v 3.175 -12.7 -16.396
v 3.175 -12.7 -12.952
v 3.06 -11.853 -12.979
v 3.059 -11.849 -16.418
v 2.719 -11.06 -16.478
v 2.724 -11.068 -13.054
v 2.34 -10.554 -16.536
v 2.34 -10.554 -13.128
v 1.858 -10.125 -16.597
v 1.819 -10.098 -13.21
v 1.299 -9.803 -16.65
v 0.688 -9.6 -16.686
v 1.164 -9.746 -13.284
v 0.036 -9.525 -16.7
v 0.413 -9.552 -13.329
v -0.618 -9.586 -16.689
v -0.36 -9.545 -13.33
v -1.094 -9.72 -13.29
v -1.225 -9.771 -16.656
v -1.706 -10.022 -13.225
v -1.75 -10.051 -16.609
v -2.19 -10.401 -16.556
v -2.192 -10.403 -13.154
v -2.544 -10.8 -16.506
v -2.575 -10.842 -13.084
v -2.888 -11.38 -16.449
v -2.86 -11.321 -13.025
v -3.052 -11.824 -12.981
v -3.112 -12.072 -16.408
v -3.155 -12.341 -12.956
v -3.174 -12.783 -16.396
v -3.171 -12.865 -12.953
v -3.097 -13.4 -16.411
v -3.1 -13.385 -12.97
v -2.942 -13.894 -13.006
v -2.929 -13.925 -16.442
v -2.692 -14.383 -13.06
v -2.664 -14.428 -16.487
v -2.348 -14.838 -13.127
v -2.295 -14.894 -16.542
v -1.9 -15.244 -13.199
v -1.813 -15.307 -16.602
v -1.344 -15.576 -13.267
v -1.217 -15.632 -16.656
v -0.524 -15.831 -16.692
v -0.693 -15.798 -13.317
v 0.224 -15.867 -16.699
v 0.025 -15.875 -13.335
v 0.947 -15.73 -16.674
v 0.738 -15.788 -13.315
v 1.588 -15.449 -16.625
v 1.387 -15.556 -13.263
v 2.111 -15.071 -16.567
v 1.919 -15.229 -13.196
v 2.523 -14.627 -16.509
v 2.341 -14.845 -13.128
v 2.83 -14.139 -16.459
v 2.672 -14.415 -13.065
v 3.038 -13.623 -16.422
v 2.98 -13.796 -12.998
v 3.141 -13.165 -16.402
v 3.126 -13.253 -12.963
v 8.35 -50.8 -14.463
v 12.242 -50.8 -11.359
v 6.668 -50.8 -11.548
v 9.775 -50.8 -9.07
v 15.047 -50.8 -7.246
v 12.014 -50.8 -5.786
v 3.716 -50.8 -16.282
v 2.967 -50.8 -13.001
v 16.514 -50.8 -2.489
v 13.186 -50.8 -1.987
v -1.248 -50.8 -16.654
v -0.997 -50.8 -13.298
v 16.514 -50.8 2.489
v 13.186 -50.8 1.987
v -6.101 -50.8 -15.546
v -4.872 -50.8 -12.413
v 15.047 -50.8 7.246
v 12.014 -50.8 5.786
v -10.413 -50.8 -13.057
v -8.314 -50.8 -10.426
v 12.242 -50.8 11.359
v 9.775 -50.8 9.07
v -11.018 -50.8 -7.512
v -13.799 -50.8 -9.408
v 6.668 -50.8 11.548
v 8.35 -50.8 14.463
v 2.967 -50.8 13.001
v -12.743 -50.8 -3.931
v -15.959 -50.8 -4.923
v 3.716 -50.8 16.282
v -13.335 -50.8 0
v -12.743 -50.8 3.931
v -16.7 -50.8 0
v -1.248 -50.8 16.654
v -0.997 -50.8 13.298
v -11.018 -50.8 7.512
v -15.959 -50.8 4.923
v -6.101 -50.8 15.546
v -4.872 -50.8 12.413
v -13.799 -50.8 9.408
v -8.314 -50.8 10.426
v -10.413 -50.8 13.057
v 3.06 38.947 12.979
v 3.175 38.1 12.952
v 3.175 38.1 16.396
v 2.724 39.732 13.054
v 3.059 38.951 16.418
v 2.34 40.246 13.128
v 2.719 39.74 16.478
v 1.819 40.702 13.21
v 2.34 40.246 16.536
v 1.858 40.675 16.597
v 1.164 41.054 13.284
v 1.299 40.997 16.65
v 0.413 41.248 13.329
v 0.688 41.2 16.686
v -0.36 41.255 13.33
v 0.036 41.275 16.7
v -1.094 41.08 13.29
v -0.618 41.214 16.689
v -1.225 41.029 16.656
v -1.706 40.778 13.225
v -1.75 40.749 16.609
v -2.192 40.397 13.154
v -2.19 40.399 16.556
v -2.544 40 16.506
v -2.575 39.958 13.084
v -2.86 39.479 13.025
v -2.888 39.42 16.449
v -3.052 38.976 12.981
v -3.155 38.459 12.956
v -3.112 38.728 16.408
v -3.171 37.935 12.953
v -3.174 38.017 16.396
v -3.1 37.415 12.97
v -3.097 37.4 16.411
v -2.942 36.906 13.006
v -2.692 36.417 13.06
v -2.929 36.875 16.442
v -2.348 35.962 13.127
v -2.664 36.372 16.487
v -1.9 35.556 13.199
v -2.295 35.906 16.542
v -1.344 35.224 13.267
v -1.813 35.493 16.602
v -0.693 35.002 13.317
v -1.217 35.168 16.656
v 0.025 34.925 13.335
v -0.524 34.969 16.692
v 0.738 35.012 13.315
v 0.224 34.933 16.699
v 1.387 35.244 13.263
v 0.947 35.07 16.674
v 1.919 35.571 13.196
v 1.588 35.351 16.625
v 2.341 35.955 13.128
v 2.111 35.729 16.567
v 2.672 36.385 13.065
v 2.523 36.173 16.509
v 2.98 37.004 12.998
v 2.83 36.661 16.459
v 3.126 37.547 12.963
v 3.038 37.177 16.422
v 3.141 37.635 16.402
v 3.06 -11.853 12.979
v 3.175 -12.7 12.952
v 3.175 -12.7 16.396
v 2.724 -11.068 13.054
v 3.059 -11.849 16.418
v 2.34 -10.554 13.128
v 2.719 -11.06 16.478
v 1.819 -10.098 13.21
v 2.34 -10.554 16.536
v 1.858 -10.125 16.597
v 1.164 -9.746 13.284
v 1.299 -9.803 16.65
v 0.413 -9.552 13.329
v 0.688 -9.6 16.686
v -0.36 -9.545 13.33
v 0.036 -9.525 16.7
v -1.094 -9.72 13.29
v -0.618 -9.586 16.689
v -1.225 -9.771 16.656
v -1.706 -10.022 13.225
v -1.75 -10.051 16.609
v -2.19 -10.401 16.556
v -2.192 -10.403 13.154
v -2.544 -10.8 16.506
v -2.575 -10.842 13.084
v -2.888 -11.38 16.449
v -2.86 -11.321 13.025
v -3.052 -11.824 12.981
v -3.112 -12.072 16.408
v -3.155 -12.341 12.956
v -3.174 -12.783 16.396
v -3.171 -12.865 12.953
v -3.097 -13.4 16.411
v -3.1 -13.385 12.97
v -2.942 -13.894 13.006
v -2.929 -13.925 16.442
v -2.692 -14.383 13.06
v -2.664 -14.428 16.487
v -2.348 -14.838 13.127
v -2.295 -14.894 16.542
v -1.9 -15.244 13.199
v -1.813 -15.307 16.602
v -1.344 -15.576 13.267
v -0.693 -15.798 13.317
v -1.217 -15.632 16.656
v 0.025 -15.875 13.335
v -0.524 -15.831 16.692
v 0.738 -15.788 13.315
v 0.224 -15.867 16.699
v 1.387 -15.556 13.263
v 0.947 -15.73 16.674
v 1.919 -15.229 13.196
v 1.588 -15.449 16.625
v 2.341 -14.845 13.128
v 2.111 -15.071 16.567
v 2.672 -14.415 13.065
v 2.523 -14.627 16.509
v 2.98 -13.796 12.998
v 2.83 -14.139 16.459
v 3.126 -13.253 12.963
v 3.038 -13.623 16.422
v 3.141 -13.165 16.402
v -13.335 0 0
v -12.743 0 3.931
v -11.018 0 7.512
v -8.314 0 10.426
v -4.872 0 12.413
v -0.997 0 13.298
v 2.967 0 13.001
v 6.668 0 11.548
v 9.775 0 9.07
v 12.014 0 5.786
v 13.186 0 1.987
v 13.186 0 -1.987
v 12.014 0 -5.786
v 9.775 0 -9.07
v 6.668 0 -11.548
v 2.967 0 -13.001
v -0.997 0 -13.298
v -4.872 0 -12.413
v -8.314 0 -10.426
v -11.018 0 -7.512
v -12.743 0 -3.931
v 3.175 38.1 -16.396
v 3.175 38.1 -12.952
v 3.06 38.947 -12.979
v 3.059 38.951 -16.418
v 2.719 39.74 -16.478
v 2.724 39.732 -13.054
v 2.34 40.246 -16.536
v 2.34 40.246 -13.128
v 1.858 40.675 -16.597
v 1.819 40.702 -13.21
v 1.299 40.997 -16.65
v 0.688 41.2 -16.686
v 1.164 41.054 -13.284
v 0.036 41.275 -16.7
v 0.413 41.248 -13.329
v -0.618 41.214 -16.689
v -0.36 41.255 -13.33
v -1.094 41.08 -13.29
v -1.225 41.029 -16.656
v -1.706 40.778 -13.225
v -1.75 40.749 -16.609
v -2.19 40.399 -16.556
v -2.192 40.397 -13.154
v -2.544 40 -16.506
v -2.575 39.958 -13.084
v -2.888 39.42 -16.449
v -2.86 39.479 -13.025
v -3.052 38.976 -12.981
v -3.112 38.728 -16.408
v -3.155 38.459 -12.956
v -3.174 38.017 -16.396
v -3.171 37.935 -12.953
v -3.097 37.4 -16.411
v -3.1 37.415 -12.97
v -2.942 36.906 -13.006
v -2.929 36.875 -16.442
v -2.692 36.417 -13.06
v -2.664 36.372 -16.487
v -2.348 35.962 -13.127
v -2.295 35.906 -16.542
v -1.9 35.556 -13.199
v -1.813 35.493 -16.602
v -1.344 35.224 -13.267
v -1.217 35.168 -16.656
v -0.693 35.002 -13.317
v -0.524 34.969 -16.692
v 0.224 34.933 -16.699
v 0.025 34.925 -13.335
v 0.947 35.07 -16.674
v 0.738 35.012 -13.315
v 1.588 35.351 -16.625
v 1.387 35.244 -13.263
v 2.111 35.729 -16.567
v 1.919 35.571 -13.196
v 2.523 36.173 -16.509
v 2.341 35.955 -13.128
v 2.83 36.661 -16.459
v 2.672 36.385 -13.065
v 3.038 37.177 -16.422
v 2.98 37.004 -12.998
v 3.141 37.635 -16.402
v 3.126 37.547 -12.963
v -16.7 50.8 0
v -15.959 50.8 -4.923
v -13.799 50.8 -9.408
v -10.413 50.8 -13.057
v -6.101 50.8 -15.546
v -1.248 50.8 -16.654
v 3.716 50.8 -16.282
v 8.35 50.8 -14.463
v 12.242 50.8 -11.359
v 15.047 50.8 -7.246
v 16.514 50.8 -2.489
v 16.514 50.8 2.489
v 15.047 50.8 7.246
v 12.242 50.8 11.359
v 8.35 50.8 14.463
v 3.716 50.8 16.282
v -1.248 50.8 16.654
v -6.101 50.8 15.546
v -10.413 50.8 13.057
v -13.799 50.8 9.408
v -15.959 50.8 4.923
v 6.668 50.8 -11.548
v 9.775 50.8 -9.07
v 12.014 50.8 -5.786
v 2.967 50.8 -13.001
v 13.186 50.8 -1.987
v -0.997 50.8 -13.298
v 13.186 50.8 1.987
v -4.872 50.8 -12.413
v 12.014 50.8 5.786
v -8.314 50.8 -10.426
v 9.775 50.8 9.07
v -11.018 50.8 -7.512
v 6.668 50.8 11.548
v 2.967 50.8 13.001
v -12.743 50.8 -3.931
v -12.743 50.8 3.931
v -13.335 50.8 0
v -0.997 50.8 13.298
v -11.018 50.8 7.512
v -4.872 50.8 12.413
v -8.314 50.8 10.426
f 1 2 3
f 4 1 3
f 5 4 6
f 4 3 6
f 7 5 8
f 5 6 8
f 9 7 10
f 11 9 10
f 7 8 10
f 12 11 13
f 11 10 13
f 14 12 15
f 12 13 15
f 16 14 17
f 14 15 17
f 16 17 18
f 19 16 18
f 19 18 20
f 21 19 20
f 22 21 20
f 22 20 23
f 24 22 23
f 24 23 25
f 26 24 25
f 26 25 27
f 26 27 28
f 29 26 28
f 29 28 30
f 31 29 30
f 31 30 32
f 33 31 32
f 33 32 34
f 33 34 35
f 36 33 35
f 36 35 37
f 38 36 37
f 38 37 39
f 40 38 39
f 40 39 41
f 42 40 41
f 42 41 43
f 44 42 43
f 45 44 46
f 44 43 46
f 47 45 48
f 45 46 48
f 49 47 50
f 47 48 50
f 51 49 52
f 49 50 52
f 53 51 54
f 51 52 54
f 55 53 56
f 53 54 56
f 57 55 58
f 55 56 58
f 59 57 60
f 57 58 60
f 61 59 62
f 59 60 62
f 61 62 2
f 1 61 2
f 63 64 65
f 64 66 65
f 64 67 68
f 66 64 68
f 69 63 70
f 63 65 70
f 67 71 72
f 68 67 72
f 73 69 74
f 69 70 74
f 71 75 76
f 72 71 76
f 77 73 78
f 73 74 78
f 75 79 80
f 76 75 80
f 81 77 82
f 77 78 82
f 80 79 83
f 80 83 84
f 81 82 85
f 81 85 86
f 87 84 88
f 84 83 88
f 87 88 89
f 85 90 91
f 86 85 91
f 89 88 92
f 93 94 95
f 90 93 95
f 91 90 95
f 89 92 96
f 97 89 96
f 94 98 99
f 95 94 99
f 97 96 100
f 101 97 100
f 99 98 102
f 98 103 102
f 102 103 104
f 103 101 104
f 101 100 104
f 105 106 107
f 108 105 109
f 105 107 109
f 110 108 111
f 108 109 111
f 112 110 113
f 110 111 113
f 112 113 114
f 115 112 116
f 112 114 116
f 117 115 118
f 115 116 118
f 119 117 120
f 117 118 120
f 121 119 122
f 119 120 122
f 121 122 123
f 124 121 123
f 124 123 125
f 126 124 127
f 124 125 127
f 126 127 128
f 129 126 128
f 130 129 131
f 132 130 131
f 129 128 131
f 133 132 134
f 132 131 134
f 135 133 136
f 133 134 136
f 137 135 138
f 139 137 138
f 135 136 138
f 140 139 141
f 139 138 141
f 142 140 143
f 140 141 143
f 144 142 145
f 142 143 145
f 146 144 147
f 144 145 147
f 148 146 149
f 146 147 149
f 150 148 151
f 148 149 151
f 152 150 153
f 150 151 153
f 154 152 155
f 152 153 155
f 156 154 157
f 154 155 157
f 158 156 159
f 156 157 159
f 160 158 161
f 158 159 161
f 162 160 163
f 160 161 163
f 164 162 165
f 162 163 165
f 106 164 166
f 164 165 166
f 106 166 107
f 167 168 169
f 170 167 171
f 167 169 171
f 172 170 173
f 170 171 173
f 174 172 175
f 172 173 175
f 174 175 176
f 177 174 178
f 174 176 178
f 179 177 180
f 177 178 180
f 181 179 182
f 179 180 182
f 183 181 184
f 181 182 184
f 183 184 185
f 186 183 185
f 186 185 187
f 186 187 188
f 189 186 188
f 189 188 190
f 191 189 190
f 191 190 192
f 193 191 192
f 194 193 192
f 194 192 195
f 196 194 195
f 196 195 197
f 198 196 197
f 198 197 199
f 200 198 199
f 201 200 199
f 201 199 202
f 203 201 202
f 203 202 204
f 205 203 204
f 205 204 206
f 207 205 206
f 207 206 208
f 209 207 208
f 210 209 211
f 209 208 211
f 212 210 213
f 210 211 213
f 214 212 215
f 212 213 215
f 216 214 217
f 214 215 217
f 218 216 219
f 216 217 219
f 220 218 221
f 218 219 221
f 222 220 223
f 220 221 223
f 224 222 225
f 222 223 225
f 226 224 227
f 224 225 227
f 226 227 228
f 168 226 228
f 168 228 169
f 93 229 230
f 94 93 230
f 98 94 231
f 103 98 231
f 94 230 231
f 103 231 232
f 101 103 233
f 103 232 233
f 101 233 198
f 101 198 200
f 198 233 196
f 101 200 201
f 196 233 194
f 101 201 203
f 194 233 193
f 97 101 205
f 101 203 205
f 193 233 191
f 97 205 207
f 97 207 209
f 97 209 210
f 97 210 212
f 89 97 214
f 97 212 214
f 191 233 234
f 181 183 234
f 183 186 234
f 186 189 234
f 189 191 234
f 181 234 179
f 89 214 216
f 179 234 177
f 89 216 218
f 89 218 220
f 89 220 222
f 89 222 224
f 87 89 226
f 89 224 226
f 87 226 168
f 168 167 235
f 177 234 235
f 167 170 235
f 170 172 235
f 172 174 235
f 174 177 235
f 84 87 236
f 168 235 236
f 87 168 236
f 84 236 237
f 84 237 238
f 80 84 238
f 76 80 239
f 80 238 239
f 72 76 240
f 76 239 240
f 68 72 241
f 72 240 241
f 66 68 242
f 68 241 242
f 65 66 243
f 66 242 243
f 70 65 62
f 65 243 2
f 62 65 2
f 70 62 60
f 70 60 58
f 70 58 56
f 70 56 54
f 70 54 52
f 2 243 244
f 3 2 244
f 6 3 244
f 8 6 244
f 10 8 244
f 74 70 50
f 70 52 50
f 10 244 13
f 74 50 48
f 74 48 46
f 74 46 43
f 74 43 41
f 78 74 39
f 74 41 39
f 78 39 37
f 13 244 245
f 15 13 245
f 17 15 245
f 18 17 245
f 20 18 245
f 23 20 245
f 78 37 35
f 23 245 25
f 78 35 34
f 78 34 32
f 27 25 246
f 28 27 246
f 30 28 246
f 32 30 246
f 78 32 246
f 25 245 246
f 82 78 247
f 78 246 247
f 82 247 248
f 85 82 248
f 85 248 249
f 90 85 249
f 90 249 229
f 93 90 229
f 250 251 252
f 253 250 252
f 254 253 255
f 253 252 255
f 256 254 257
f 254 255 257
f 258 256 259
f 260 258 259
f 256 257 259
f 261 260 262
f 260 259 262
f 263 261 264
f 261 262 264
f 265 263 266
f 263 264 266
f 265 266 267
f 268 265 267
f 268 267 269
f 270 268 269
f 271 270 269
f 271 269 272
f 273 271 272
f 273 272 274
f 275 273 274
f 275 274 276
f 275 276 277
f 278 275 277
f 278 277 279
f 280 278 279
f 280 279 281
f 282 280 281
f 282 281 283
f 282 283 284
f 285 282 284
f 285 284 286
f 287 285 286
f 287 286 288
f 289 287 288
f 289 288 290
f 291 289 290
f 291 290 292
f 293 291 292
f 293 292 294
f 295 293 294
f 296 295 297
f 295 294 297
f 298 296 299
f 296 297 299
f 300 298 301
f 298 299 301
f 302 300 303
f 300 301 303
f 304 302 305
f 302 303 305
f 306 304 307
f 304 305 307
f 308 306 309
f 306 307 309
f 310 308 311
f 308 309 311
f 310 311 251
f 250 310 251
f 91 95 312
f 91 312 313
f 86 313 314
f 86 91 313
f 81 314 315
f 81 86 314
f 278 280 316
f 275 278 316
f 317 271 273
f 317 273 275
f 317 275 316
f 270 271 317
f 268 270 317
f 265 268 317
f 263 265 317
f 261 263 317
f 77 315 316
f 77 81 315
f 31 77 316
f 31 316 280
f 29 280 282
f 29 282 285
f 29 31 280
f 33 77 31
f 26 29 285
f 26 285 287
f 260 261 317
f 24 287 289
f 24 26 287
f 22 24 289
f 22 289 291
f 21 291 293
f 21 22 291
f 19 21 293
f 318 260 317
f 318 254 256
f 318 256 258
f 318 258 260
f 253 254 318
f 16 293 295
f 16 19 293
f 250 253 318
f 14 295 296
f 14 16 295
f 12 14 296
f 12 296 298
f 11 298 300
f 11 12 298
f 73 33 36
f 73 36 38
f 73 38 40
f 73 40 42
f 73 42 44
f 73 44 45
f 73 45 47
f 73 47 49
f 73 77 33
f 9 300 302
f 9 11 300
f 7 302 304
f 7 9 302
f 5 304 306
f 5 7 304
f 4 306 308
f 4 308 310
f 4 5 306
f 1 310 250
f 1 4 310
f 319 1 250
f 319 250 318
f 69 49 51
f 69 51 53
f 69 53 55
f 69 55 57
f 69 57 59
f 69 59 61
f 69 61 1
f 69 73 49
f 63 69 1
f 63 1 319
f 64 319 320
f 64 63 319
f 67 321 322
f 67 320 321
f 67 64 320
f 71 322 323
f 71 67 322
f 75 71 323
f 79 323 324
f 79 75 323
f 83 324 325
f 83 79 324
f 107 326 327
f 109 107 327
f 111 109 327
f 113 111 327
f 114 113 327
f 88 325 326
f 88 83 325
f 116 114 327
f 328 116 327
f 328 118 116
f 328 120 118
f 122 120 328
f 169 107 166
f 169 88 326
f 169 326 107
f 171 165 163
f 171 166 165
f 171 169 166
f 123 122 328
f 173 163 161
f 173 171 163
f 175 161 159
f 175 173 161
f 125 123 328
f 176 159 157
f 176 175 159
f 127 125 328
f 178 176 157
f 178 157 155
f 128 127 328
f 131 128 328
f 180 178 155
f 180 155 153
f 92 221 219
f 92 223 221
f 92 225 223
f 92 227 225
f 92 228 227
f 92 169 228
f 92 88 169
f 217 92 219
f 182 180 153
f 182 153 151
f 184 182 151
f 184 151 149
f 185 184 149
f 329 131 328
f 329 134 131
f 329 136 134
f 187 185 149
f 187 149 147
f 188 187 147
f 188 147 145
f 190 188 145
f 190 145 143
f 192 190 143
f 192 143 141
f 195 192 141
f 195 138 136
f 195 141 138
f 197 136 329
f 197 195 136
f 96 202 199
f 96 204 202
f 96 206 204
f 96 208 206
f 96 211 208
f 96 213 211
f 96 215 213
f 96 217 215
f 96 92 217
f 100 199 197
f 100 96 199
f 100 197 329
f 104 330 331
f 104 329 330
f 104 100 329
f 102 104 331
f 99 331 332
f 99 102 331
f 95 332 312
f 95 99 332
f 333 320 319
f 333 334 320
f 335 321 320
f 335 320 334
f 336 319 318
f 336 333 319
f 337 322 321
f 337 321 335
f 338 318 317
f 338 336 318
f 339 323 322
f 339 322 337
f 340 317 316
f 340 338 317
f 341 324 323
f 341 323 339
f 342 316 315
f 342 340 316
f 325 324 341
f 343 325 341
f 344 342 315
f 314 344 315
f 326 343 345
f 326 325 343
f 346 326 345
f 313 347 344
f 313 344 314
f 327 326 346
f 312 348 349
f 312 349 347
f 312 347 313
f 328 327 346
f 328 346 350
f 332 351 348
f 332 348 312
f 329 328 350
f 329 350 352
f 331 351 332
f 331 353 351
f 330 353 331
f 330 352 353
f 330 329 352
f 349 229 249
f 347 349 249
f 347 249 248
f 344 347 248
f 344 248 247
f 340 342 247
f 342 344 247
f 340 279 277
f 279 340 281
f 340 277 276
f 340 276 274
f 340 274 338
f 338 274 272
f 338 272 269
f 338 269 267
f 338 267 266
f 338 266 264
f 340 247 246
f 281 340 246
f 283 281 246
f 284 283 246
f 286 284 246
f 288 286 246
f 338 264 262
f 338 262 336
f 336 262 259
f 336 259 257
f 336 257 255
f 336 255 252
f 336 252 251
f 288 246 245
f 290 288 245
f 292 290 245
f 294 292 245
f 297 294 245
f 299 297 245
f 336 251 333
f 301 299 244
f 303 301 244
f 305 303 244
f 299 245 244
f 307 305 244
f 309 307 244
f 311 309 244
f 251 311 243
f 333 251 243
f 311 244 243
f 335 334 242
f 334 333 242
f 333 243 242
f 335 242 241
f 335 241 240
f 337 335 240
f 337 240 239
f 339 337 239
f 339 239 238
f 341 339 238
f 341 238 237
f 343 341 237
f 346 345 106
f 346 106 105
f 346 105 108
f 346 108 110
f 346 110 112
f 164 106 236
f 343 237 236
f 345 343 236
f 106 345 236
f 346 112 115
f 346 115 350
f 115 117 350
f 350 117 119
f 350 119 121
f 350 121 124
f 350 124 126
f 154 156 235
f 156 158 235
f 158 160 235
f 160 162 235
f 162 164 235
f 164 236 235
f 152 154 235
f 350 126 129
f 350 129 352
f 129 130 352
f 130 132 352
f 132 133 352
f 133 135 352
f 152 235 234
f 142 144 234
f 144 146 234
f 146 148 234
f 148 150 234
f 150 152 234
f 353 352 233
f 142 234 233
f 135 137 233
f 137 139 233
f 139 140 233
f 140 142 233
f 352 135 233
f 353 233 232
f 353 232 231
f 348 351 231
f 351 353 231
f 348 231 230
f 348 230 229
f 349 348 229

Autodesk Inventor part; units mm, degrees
ref_plane "YZ Plane" through (0, 0, 0) normal (1, 0, 0) x (0, 1, 0)
ref_plane "XZ Plane" through (0, 0, 0) normal (0, 1, 0) x (-1, 0, 0)
ref_plane "XY Plane" through (0, 0, 0) normal (0, 0, 1) x (1, 0, 0)
sketch "Sketch1" plane through (0, 0, 0) normal (0, 1, 0) x (-1, 0, 0)
  circle A0 centre (0, 0) radius 16.7005
  circle A1 centre (0, 0) radius 13.335
  dimension "d0" = 33.401
  dimension "d1" = 26.67
extrude "Extrusion1" add sketch "Sketch1" along normal mid plane 101.6
sketch "Sketch3" plane through (0, 0, 0) normal (0, 0, 1) x (1, 0, 0)
  circle A0 centre (0, 38.1) radius 3.175
  circle A1 centre (0, -12.7) radius 3.175
  line L0 (16.7005, 50.8) -> (-16.7005, 50.8) projected
  point P0 (0, 0)
  dimension "d10" = 12.7
  dimension "d12" = 6.35
  dimension "d15" = 50.8
extrude "Extrusion3" cut sketch "Sketch3" against normal through all both and the other way through all
properties part number "FE-130-003 Insert" material "Aluminum 6061"
